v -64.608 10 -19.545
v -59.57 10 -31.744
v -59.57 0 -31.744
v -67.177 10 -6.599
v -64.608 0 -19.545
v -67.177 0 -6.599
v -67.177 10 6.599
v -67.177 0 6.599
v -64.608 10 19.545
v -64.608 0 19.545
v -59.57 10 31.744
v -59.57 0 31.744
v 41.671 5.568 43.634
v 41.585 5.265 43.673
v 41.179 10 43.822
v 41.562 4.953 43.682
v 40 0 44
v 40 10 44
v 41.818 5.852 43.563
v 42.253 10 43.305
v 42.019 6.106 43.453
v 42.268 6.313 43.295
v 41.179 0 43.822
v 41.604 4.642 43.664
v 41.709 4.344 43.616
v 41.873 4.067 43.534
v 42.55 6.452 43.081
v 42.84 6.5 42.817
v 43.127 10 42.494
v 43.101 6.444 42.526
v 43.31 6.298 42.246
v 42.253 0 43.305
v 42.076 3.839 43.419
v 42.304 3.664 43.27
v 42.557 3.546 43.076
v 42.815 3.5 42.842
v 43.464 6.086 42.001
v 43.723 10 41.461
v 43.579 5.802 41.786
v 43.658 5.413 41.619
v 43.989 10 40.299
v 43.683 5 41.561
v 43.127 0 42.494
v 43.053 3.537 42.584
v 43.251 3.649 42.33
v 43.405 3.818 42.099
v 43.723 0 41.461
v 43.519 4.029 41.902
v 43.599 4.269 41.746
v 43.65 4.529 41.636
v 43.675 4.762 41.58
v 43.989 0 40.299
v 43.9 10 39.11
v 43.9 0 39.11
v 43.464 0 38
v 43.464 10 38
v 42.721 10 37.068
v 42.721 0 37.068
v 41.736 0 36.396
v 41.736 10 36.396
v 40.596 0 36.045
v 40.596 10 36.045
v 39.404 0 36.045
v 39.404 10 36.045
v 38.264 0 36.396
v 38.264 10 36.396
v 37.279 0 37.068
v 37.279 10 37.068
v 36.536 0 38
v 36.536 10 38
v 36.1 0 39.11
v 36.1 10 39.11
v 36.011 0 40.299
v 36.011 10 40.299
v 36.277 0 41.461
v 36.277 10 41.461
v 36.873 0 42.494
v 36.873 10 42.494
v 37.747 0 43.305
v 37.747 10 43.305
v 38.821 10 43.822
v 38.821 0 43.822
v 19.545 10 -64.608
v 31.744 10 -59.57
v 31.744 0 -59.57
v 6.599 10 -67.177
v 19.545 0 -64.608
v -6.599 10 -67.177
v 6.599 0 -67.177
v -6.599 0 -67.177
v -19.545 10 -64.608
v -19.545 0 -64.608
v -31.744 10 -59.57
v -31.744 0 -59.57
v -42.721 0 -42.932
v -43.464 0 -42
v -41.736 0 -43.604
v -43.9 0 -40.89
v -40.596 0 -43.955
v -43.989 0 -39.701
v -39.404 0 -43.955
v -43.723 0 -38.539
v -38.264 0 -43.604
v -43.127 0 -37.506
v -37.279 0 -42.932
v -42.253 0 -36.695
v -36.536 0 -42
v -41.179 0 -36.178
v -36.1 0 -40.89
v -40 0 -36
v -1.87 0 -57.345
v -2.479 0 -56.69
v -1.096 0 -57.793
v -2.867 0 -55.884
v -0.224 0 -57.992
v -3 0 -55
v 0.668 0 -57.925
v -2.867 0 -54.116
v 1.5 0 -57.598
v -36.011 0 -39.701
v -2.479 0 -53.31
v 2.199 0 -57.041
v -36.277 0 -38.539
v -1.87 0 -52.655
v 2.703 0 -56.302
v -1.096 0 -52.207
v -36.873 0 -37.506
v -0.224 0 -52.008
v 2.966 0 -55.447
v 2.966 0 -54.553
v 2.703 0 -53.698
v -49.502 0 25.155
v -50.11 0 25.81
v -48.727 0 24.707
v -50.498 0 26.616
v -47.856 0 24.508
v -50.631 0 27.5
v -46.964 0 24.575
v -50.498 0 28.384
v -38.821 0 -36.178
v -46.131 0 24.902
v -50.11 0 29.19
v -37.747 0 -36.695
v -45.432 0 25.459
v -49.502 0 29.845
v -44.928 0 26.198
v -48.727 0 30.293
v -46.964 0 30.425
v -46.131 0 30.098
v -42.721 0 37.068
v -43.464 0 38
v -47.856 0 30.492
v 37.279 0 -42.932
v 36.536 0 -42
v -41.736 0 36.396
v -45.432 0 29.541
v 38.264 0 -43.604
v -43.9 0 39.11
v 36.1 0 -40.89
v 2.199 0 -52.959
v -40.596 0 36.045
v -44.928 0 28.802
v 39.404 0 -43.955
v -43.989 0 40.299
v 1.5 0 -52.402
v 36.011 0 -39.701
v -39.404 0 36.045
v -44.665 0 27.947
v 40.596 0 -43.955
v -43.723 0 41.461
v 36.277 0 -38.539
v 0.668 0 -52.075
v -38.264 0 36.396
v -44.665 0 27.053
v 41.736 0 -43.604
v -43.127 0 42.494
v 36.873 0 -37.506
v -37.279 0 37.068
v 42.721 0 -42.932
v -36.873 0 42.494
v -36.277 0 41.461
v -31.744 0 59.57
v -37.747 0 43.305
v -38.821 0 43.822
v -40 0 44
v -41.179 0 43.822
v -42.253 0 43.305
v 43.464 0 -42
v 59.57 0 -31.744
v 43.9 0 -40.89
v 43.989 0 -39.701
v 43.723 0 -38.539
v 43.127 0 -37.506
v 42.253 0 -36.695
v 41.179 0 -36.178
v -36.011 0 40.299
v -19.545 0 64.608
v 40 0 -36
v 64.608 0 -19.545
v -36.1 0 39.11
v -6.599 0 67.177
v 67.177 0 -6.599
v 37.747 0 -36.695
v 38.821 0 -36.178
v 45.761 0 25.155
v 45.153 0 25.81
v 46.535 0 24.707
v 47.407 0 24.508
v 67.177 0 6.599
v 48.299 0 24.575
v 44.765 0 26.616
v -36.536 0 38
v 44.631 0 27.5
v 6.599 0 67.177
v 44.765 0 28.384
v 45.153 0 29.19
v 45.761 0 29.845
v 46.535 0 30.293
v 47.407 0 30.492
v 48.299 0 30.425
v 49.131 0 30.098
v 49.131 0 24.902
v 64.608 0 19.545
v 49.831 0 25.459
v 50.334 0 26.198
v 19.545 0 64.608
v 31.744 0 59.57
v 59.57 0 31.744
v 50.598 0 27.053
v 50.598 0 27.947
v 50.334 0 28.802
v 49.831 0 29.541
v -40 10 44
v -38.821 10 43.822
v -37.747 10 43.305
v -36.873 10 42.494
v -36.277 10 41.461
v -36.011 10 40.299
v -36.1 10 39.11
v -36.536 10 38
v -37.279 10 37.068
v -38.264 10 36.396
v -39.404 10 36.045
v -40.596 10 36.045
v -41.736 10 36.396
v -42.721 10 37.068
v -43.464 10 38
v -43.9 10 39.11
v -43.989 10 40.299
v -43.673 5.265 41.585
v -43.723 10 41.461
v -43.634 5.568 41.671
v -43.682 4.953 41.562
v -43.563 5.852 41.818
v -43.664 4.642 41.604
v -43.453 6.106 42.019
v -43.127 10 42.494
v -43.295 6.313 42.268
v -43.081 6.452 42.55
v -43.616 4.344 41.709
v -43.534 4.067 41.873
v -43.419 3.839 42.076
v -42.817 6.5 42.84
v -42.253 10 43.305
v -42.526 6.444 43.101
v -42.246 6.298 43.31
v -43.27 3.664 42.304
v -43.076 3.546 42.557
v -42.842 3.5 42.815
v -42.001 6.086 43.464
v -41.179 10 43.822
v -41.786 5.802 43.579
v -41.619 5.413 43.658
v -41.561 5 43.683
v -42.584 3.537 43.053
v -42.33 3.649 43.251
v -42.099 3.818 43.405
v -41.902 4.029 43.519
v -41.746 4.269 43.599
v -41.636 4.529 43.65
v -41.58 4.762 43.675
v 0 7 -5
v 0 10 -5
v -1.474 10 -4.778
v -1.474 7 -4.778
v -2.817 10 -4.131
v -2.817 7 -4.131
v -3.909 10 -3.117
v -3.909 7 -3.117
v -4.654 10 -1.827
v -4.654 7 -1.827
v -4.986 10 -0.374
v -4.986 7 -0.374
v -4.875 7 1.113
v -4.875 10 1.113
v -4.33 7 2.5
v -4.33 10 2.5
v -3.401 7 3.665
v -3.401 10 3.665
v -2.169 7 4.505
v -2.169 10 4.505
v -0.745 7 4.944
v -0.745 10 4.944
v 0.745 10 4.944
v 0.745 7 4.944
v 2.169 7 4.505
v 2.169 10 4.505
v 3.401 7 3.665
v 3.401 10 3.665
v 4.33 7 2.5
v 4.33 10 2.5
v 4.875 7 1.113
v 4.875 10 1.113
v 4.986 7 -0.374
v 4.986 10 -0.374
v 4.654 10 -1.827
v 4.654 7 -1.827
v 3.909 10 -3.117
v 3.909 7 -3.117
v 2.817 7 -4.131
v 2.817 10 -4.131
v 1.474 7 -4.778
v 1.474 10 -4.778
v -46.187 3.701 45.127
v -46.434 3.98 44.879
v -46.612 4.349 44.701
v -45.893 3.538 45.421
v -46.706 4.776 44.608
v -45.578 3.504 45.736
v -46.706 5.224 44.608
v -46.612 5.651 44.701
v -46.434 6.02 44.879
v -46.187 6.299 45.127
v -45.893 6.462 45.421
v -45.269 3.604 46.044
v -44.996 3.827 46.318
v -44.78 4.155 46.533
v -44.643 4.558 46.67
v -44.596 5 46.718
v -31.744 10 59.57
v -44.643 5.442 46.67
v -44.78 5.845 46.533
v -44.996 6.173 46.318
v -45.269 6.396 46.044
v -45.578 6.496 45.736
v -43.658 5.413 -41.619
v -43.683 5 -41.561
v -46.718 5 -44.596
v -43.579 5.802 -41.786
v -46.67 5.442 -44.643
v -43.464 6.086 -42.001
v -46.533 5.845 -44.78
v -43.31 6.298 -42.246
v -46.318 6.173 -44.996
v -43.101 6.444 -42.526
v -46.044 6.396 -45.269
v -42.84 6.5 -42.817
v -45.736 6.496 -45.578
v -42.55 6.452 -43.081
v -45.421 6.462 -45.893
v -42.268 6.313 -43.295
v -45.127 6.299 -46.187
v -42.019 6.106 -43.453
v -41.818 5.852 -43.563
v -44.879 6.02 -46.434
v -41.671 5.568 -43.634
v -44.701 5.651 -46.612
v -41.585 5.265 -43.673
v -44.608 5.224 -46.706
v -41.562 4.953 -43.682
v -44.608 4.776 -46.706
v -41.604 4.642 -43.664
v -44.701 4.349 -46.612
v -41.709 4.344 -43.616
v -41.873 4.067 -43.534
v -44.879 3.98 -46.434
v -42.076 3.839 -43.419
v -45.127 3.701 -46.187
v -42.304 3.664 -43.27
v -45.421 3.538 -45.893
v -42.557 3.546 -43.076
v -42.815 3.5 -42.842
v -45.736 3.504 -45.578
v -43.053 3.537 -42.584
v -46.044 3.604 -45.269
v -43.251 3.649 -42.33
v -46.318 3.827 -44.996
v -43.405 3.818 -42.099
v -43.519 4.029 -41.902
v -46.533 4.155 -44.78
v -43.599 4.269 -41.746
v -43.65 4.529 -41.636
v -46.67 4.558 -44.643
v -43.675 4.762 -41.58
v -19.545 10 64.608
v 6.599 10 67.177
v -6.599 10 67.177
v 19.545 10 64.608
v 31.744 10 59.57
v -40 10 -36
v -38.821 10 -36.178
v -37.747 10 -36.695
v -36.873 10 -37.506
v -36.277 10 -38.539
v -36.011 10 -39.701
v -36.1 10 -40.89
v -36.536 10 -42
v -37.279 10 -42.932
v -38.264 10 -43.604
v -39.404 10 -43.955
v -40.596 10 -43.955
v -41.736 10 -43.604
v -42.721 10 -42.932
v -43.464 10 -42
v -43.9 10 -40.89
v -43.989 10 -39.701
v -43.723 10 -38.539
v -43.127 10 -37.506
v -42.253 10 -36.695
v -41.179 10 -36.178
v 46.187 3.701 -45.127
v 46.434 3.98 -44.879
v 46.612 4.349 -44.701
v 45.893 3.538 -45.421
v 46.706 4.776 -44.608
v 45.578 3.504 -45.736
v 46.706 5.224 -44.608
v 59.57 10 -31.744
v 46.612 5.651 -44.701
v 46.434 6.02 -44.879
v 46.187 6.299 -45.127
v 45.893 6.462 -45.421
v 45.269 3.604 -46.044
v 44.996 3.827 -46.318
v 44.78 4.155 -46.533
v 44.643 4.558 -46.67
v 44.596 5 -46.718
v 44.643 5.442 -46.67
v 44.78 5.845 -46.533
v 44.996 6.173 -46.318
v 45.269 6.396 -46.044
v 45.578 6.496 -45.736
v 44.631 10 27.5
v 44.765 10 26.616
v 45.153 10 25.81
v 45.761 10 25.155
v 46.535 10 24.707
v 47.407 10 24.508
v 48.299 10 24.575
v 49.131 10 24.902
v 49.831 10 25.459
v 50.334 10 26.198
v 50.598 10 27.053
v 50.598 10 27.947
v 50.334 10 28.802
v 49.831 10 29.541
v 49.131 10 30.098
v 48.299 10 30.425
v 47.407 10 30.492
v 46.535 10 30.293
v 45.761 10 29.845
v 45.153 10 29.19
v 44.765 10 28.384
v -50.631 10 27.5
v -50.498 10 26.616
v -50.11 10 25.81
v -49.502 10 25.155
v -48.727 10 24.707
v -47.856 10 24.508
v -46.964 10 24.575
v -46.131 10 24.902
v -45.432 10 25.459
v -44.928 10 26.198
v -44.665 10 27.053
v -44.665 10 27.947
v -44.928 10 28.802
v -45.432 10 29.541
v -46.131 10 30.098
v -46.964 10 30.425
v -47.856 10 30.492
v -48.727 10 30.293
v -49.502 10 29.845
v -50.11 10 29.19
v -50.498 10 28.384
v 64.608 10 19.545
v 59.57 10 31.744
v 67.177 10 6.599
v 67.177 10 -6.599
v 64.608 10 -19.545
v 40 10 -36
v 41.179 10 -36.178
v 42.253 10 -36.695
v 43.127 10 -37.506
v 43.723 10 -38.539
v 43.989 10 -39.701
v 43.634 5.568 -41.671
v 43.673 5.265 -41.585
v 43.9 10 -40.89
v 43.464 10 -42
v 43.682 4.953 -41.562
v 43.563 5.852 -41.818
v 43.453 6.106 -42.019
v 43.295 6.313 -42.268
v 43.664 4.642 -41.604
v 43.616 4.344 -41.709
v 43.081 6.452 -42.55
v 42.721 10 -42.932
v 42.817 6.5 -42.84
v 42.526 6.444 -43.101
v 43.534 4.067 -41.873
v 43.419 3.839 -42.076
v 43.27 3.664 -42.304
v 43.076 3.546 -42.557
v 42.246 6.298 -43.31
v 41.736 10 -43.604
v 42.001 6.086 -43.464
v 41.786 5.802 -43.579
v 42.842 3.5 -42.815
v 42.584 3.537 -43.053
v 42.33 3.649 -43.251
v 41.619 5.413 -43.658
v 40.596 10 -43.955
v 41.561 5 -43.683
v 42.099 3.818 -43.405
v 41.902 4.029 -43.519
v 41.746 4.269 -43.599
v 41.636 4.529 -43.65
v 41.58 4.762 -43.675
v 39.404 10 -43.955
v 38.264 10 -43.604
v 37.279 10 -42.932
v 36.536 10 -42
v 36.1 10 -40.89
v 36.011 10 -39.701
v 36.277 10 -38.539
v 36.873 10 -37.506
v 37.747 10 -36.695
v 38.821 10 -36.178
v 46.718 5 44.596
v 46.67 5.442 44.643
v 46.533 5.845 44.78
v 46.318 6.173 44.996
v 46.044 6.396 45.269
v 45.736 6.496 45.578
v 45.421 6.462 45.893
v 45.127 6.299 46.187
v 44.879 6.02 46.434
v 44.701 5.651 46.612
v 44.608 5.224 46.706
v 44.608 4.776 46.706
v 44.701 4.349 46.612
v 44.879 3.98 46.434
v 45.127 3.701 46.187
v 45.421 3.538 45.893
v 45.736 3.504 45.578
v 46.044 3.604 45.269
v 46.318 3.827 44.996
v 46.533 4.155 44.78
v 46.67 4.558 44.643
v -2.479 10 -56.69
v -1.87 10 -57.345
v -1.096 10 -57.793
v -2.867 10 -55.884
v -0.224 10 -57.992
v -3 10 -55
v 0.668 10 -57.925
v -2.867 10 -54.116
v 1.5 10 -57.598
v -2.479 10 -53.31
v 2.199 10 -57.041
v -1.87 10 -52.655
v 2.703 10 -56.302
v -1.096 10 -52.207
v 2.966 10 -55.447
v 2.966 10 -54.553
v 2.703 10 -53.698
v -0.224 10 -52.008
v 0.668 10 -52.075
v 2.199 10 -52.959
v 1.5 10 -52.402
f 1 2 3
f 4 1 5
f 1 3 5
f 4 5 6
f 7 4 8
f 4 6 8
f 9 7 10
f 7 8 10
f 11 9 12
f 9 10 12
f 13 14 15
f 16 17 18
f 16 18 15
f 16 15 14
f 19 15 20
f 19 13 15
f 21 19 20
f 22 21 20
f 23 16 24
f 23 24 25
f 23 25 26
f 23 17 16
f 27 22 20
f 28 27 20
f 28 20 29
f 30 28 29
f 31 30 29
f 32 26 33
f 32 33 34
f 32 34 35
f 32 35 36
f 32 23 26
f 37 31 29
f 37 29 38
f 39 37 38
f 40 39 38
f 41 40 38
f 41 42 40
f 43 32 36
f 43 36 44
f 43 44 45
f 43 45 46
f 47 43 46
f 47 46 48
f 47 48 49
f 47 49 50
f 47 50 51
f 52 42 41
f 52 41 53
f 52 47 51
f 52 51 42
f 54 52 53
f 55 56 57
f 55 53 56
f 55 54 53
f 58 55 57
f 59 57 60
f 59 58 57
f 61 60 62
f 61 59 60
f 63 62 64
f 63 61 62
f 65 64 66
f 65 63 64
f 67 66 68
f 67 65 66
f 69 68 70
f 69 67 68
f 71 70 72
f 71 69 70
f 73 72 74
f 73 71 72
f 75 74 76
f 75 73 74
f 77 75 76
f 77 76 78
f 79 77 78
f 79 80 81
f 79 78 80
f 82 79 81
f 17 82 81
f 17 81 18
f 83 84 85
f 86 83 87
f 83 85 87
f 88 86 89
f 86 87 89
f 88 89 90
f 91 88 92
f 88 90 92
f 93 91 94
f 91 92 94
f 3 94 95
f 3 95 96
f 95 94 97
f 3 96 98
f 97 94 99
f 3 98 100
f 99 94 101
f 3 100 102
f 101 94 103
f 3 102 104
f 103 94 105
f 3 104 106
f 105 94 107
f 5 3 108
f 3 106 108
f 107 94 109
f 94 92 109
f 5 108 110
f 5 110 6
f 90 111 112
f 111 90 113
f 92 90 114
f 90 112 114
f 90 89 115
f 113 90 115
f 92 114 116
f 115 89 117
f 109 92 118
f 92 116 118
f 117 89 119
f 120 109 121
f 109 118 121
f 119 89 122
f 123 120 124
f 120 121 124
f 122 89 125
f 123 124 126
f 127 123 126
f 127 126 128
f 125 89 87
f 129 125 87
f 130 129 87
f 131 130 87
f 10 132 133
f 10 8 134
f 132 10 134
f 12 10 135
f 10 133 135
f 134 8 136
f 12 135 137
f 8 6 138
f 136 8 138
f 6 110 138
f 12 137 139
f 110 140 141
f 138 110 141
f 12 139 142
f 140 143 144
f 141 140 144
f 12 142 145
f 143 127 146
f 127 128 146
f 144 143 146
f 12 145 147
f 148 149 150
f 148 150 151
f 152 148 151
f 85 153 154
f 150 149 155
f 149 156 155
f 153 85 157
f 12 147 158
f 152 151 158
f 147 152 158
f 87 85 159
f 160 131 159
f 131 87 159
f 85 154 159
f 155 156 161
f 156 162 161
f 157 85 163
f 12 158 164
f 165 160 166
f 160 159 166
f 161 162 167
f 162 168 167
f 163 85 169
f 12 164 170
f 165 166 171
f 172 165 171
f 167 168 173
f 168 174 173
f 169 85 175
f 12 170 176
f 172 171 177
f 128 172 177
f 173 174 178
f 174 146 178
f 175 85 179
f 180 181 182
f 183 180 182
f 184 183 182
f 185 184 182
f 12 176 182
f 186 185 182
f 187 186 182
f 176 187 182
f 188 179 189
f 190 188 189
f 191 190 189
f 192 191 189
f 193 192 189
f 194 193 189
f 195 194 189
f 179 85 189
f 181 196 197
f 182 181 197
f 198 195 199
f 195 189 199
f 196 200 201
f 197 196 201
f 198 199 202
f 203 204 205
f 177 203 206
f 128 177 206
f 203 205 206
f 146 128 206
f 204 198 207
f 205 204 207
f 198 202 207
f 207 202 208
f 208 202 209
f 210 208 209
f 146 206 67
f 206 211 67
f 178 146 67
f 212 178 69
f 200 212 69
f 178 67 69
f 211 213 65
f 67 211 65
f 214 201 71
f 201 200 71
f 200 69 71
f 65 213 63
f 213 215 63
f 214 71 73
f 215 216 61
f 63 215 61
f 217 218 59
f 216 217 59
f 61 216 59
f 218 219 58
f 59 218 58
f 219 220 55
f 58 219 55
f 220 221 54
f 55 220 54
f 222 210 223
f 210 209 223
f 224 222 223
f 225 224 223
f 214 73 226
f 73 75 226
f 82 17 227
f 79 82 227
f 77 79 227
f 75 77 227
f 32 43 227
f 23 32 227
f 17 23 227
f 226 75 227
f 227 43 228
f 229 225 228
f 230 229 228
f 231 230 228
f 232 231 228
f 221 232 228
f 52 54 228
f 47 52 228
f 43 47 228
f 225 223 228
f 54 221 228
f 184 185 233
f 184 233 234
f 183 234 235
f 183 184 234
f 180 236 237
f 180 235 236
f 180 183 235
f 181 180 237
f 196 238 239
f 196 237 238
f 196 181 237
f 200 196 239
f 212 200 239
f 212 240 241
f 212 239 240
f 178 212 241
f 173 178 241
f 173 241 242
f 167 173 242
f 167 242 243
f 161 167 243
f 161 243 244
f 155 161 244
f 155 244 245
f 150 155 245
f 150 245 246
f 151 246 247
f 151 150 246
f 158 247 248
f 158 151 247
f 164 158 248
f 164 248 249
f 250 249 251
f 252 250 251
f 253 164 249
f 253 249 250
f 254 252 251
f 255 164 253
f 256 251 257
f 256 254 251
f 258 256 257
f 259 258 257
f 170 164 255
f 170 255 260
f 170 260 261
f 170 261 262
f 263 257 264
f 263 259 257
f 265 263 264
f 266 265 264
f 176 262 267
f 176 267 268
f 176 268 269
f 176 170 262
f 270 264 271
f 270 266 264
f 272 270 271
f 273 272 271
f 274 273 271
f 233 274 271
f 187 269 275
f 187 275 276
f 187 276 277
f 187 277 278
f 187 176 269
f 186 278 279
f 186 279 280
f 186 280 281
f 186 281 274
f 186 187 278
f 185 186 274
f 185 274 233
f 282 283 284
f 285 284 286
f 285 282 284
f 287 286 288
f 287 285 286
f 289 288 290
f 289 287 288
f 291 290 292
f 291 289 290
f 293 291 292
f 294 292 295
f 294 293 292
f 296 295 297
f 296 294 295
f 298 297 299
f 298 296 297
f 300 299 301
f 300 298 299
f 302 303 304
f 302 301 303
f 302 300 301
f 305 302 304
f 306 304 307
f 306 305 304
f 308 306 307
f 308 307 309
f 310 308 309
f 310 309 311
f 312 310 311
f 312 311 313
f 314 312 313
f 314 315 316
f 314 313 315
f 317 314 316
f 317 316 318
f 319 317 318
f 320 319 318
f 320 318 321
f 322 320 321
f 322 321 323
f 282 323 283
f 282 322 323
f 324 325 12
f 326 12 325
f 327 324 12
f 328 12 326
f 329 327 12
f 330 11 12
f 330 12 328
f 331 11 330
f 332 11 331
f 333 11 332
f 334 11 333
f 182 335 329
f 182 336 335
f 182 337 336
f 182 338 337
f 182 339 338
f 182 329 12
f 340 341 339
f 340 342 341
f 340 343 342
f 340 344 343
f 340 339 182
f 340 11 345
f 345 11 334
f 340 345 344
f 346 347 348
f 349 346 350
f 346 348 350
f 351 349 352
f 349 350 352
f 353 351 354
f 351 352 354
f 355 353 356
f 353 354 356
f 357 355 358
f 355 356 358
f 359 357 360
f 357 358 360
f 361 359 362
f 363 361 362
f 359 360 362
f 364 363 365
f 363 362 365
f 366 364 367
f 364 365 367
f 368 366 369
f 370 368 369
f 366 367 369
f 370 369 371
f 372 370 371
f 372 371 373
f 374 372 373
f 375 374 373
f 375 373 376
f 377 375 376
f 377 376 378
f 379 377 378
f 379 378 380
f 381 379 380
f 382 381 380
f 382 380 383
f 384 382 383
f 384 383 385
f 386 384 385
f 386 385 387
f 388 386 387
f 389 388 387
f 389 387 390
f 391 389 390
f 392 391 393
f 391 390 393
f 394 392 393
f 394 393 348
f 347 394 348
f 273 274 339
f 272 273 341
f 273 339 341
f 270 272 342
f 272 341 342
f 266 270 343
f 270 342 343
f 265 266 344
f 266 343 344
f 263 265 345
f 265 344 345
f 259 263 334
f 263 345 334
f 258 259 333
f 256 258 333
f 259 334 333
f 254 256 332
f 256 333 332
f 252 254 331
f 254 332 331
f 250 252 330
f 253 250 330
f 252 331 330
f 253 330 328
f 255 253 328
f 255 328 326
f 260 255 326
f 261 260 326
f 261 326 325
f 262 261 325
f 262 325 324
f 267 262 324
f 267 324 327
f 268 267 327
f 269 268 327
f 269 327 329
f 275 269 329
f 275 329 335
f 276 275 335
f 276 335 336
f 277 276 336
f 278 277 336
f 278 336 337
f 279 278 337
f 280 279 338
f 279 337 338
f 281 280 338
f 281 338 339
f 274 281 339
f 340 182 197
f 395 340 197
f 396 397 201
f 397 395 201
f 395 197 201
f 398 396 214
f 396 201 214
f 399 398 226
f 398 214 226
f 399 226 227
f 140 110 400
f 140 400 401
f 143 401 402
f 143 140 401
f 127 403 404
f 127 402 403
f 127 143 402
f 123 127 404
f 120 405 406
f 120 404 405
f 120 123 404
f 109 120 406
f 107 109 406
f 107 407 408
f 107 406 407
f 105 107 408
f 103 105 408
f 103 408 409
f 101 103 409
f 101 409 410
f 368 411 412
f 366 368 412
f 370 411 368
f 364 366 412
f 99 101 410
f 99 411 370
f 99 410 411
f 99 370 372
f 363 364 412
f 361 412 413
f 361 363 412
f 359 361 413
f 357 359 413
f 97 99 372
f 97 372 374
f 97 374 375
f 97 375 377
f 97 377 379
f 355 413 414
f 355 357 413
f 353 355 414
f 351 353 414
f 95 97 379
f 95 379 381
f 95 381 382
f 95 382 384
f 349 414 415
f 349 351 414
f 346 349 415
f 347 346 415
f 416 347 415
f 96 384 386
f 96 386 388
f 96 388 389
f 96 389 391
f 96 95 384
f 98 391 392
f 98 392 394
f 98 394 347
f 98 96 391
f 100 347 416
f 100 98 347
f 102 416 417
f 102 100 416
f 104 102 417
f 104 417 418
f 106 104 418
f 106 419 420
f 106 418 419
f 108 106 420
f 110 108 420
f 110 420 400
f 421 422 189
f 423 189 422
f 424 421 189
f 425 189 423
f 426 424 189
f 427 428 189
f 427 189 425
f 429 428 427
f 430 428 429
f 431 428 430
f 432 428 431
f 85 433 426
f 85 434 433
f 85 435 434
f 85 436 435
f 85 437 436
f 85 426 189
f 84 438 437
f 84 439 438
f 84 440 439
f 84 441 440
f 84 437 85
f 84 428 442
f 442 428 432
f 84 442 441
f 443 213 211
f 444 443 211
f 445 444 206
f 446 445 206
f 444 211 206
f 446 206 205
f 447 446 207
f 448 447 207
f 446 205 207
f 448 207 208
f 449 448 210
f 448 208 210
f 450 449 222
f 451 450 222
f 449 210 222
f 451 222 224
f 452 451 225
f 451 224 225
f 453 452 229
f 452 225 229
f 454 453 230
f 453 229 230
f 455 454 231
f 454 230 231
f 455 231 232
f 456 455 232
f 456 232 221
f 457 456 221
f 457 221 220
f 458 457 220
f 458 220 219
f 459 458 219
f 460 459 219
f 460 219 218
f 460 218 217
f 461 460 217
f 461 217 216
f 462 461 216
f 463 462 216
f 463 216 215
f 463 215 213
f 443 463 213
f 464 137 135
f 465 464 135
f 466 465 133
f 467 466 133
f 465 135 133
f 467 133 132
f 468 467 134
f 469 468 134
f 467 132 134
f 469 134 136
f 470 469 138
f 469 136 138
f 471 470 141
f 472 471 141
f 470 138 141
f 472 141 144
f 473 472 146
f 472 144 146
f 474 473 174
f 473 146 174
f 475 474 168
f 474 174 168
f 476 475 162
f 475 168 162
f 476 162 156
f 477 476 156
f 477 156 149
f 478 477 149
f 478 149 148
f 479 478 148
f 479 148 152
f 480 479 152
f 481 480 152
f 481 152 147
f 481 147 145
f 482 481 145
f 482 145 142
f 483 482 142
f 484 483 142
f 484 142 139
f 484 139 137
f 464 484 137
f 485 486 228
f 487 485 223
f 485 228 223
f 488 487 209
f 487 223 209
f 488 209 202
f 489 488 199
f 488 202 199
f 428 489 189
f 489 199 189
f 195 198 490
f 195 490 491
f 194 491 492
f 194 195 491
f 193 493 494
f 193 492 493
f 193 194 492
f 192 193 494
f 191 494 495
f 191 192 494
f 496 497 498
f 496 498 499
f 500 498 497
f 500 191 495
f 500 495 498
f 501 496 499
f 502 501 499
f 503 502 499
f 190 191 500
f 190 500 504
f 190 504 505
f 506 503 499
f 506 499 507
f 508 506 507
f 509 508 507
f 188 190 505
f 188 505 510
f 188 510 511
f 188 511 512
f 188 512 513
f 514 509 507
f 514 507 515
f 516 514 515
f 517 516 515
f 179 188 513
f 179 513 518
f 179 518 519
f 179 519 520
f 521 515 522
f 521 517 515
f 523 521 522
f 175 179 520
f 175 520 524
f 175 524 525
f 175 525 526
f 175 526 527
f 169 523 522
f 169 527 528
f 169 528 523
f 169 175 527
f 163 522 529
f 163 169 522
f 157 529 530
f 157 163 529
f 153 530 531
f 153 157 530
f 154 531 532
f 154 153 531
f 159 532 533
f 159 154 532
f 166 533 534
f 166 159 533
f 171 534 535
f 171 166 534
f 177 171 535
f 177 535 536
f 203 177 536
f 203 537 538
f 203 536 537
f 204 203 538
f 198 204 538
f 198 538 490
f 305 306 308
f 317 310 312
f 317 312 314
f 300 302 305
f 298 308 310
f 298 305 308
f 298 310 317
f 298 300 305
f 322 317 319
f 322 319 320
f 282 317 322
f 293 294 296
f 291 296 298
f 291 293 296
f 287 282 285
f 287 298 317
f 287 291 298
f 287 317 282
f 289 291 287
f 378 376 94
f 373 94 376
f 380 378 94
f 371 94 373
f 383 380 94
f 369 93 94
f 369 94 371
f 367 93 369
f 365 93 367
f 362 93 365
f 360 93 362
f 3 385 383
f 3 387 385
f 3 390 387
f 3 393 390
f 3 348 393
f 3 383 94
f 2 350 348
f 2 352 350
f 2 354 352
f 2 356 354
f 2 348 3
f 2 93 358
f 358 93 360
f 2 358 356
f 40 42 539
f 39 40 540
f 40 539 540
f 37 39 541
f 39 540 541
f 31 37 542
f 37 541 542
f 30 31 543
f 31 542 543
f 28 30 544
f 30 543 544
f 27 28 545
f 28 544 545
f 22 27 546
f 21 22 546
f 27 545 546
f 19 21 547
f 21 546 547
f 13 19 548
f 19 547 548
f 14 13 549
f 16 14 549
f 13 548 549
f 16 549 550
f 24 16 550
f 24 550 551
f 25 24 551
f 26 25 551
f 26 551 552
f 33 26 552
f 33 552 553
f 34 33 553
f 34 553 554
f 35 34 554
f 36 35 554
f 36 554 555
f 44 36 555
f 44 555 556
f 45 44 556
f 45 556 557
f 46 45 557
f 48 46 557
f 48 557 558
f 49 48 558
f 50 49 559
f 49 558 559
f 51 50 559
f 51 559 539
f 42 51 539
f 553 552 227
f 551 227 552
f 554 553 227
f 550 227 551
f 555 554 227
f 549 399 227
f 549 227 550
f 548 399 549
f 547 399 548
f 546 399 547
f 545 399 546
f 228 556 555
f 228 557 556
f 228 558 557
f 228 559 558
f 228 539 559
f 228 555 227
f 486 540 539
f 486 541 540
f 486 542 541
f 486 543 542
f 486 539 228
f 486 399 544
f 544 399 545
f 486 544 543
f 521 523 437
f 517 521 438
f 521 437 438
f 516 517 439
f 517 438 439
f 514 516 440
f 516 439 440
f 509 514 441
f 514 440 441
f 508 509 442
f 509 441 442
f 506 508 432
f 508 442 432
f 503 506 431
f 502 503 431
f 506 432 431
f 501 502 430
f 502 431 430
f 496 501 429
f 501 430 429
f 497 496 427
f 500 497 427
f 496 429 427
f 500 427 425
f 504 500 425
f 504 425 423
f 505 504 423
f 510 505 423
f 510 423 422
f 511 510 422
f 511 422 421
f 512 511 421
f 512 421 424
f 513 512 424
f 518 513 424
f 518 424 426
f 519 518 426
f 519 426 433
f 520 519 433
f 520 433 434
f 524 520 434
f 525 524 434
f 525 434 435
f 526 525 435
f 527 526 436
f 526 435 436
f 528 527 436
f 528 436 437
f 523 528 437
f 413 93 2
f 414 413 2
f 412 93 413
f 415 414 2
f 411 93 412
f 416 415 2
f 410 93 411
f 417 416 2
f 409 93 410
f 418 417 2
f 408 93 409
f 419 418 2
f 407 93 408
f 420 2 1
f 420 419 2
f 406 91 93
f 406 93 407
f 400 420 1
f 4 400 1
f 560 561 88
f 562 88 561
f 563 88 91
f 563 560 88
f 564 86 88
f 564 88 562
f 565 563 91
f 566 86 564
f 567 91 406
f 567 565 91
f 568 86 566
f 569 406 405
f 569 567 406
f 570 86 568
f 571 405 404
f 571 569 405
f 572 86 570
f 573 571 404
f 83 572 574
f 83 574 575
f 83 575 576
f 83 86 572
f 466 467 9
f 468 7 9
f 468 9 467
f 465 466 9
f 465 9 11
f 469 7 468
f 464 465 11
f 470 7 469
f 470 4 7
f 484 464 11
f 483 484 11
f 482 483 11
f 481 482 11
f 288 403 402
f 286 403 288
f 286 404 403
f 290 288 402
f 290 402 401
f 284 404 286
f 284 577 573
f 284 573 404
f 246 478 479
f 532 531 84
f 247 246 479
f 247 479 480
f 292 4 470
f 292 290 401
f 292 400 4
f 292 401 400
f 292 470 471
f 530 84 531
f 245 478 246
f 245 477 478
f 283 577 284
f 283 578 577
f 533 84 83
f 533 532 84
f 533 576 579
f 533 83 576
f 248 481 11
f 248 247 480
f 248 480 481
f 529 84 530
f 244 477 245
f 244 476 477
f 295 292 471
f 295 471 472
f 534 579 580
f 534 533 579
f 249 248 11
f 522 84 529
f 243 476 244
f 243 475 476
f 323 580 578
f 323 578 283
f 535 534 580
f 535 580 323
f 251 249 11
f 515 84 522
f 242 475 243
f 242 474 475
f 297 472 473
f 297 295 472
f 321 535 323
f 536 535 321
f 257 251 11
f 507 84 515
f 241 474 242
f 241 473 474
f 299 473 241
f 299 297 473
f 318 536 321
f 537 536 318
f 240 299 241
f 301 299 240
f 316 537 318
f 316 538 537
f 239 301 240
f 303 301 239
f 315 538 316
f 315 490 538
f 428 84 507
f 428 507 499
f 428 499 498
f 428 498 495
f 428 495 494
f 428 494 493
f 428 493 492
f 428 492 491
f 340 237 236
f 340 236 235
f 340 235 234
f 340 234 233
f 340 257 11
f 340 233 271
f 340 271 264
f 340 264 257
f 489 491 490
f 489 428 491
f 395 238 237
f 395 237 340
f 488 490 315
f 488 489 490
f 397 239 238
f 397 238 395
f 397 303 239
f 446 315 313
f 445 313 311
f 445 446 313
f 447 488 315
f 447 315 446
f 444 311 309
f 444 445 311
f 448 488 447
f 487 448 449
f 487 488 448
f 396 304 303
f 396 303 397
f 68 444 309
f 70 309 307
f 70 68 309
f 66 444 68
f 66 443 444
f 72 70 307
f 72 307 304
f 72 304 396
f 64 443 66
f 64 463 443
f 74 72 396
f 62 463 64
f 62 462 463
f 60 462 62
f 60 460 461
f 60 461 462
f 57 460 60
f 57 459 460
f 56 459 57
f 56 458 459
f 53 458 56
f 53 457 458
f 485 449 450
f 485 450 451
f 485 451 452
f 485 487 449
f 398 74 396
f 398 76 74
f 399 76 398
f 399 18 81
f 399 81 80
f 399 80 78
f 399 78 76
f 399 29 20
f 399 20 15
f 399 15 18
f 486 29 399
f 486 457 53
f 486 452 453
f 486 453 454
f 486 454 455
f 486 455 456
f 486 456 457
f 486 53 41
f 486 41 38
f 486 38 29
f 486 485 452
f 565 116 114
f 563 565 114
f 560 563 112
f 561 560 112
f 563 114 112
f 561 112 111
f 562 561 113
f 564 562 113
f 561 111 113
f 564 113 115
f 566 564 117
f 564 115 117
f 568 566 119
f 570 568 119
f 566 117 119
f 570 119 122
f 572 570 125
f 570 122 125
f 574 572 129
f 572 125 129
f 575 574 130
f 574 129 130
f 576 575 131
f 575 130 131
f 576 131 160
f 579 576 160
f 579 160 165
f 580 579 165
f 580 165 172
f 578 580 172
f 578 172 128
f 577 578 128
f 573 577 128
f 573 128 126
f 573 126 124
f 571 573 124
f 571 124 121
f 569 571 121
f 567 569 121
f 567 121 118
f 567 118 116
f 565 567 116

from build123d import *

# Parameters (mm, degrees)
SKETCH1_R                  = 67.5
BOSS_EXTRUDE1_DEPTH        = 10
F_6_0MM_DOWEL_HOLE1_D      = 6
CUT_EXTRUDE1_DEPTH         = 96.981769102
CUT_EXTRUDE1_DEPTH_BACK    = 96.981769102
SKETCH4_R                  = 4
CUT_EXTRUDE_THIN1_DEPTH    = 96.981769102
F_3_0MM_DOWEL_HOLE1_REACH  = 162.34
F_3_0MM_DOWEL_HOLE1_BORE_R = 1.5
CIRPATTERN1_COUNT          = 4
CUT_EXTRUDE2_DEPTH         = 96.981769113
CUT_EXTRUDE2_DEPTH_BACK    = 3
SKETCH8_R                  = 5


with BuildPart() as part:
    # Sketch1 → Boss-Extrude1 (new body)
    with BuildSketch(Plane(origin=(0, 0, 0), x_dir=(1, 0, 0), z_dir=(0, 1, 0))):
        with Locations(Location((0, 0, 0), (0, 0, 270))):
            Circle(SKETCH1_R)
    extrude(amount=BOSS_EXTRUDE1_DEPTH)

    # Ø6.0mm Dowel Hole1 (through all)
    with Locations(Plane(origin=(0, 10, 0), x_dir=(1, 0, 0), z_dir=(0, 1, 0))):
        with Locations((0, 55), (47.631397208, -27.5), (-47.631397208, -27.5)):
            Hole(F_6_0MM_DOWEL_HOLE1_D / 2)

    # Sketch4 → Cut-Extrude1 (cut, two sides: drawn at the far end of the back side and taken through both)
    with BuildSketch(Plane(origin=(0, 10, 0), x_dir=(1, 0, 0), z_dir=(0, 1, 0)).offset(-CUT_EXTRUDE1_DEPTH_BACK)):
        with Locations(Location((-40, 40, 0), (0, 0, 270))):
            Circle(SKETCH4_R)
        with Locations(Location((40, 40, 0), (0, 0, 270))):
            Circle(SKETCH4_R)
        with Locations(Location((40, -40, 0), (0, 0, 270))):
            Circle(SKETCH4_R)
        with Locations(Location((-40, -40, 0), (0, 0, 270))):
            Circle(SKETCH4_R)
    extrude(amount=CUT_EXTRUDE1_DEPTH + CUT_EXTRUDE1_DEPTH_BACK, mode=Mode.SUBTRACT)

    # Sketch5 → Cut-Extrude-Thin1 (cut, through all)
    with BuildSketch(Plane(origin=(0, 10, 0), x_dir=(1, 0, 0), z_dir=(0, 1, 0))):
        Polygon((-31.743671291, 59.570037208), (-59.570037208, 31.743671291), (-66.64110502, 38.814739103), (-38.814739103, 66.64110502), align=None)
        Polygon((59.570037208, 31.743671291), (31.743671291, 59.570037208), (38.814739103, 66.64110502), (66.64110502, 38.814739103), align=None)
        Polygon((31.743671291, -59.570037208), (59.570037208, -31.743671291), (66.64110502, -38.814739103), (38.814739103, -66.64110502), align=None)
        Polygon((-59.570037208, -31.743671291), (-31.743671291, -59.570037208), (-38.814739103, -66.64110502), (-66.64110502, -38.814739103), align=None)
    extrude(amount=-CUT_EXTRUDE_THIN1_DEPTH, mode=Mode.SUBTRACT)

    # Ø3.0mm Dowel Hole1 bore → Ø3.0mm Dowel Hole1 (cut, up to next)
    with BuildSketch(Plane(origin=(45.656854249, 0, 45.656854249), x_dir=(0.7071067811865479, 0, -0.7071067811865471), z_dir=(0.7071067811865471, 0, 0.7071067811865479)), mode=Mode.PRIVATE) as f_3_0mm_dowel_hole1_sk1:
        with Locations((0, 5)):
            Circle(F_3_0MM_DOWEL_HOLE1_BORE_R)
    f_3_0mm_dowel_hole1_tool1 = extrude(f_3_0mm_dowel_hole1_sk1.sketch, amount=-F_3_0MM_DOWEL_HOLE1_REACH, mode=Mode.PRIVATE) & part.part
    f_3_0mm_dowel_hole1 = f_3_0mm_dowel_hole1_tool1.solids().sort_by_distance((45.656854, 5, 45.656854))[0]
    add(f_3_0mm_dowel_hole1, mode=Mode.SUBTRACT)

    # CirPattern1: Ø3.0mm Dowel Hole1 ×4 about axis
    cirpattern1_axis = Axis((0, 10, 0), (0, -1, 0))
    for i in range(1, CIRPATTERN1_COUNT):
        add(f_3_0mm_dowel_hole1.rotate(cirpattern1_axis, i * 360 / CIRPATTERN1_COUNT), mode=Mode.SUBTRACT)

    # Sketch8 → Cut-Extrude2 (cut, two sides: drawn at the far end of the back side and taken through both)
    with BuildSketch(Plane(origin=(0, 10, 0), x_dir=(1, 0, 0), z_dir=(0, 1, 0)).offset(-CUT_EXTRUDE2_DEPTH_BACK)):
        with Locations(Location((0, 0, 0), (0, 0, 90))):
            Circle(SKETCH8_R)
    extrude(amount=CUT_EXTRUDE2_DEPTH + CUT_EXTRUDE2_DEPTH_BACK, mode=Mode.SUBTRACT)


solid = part.part
